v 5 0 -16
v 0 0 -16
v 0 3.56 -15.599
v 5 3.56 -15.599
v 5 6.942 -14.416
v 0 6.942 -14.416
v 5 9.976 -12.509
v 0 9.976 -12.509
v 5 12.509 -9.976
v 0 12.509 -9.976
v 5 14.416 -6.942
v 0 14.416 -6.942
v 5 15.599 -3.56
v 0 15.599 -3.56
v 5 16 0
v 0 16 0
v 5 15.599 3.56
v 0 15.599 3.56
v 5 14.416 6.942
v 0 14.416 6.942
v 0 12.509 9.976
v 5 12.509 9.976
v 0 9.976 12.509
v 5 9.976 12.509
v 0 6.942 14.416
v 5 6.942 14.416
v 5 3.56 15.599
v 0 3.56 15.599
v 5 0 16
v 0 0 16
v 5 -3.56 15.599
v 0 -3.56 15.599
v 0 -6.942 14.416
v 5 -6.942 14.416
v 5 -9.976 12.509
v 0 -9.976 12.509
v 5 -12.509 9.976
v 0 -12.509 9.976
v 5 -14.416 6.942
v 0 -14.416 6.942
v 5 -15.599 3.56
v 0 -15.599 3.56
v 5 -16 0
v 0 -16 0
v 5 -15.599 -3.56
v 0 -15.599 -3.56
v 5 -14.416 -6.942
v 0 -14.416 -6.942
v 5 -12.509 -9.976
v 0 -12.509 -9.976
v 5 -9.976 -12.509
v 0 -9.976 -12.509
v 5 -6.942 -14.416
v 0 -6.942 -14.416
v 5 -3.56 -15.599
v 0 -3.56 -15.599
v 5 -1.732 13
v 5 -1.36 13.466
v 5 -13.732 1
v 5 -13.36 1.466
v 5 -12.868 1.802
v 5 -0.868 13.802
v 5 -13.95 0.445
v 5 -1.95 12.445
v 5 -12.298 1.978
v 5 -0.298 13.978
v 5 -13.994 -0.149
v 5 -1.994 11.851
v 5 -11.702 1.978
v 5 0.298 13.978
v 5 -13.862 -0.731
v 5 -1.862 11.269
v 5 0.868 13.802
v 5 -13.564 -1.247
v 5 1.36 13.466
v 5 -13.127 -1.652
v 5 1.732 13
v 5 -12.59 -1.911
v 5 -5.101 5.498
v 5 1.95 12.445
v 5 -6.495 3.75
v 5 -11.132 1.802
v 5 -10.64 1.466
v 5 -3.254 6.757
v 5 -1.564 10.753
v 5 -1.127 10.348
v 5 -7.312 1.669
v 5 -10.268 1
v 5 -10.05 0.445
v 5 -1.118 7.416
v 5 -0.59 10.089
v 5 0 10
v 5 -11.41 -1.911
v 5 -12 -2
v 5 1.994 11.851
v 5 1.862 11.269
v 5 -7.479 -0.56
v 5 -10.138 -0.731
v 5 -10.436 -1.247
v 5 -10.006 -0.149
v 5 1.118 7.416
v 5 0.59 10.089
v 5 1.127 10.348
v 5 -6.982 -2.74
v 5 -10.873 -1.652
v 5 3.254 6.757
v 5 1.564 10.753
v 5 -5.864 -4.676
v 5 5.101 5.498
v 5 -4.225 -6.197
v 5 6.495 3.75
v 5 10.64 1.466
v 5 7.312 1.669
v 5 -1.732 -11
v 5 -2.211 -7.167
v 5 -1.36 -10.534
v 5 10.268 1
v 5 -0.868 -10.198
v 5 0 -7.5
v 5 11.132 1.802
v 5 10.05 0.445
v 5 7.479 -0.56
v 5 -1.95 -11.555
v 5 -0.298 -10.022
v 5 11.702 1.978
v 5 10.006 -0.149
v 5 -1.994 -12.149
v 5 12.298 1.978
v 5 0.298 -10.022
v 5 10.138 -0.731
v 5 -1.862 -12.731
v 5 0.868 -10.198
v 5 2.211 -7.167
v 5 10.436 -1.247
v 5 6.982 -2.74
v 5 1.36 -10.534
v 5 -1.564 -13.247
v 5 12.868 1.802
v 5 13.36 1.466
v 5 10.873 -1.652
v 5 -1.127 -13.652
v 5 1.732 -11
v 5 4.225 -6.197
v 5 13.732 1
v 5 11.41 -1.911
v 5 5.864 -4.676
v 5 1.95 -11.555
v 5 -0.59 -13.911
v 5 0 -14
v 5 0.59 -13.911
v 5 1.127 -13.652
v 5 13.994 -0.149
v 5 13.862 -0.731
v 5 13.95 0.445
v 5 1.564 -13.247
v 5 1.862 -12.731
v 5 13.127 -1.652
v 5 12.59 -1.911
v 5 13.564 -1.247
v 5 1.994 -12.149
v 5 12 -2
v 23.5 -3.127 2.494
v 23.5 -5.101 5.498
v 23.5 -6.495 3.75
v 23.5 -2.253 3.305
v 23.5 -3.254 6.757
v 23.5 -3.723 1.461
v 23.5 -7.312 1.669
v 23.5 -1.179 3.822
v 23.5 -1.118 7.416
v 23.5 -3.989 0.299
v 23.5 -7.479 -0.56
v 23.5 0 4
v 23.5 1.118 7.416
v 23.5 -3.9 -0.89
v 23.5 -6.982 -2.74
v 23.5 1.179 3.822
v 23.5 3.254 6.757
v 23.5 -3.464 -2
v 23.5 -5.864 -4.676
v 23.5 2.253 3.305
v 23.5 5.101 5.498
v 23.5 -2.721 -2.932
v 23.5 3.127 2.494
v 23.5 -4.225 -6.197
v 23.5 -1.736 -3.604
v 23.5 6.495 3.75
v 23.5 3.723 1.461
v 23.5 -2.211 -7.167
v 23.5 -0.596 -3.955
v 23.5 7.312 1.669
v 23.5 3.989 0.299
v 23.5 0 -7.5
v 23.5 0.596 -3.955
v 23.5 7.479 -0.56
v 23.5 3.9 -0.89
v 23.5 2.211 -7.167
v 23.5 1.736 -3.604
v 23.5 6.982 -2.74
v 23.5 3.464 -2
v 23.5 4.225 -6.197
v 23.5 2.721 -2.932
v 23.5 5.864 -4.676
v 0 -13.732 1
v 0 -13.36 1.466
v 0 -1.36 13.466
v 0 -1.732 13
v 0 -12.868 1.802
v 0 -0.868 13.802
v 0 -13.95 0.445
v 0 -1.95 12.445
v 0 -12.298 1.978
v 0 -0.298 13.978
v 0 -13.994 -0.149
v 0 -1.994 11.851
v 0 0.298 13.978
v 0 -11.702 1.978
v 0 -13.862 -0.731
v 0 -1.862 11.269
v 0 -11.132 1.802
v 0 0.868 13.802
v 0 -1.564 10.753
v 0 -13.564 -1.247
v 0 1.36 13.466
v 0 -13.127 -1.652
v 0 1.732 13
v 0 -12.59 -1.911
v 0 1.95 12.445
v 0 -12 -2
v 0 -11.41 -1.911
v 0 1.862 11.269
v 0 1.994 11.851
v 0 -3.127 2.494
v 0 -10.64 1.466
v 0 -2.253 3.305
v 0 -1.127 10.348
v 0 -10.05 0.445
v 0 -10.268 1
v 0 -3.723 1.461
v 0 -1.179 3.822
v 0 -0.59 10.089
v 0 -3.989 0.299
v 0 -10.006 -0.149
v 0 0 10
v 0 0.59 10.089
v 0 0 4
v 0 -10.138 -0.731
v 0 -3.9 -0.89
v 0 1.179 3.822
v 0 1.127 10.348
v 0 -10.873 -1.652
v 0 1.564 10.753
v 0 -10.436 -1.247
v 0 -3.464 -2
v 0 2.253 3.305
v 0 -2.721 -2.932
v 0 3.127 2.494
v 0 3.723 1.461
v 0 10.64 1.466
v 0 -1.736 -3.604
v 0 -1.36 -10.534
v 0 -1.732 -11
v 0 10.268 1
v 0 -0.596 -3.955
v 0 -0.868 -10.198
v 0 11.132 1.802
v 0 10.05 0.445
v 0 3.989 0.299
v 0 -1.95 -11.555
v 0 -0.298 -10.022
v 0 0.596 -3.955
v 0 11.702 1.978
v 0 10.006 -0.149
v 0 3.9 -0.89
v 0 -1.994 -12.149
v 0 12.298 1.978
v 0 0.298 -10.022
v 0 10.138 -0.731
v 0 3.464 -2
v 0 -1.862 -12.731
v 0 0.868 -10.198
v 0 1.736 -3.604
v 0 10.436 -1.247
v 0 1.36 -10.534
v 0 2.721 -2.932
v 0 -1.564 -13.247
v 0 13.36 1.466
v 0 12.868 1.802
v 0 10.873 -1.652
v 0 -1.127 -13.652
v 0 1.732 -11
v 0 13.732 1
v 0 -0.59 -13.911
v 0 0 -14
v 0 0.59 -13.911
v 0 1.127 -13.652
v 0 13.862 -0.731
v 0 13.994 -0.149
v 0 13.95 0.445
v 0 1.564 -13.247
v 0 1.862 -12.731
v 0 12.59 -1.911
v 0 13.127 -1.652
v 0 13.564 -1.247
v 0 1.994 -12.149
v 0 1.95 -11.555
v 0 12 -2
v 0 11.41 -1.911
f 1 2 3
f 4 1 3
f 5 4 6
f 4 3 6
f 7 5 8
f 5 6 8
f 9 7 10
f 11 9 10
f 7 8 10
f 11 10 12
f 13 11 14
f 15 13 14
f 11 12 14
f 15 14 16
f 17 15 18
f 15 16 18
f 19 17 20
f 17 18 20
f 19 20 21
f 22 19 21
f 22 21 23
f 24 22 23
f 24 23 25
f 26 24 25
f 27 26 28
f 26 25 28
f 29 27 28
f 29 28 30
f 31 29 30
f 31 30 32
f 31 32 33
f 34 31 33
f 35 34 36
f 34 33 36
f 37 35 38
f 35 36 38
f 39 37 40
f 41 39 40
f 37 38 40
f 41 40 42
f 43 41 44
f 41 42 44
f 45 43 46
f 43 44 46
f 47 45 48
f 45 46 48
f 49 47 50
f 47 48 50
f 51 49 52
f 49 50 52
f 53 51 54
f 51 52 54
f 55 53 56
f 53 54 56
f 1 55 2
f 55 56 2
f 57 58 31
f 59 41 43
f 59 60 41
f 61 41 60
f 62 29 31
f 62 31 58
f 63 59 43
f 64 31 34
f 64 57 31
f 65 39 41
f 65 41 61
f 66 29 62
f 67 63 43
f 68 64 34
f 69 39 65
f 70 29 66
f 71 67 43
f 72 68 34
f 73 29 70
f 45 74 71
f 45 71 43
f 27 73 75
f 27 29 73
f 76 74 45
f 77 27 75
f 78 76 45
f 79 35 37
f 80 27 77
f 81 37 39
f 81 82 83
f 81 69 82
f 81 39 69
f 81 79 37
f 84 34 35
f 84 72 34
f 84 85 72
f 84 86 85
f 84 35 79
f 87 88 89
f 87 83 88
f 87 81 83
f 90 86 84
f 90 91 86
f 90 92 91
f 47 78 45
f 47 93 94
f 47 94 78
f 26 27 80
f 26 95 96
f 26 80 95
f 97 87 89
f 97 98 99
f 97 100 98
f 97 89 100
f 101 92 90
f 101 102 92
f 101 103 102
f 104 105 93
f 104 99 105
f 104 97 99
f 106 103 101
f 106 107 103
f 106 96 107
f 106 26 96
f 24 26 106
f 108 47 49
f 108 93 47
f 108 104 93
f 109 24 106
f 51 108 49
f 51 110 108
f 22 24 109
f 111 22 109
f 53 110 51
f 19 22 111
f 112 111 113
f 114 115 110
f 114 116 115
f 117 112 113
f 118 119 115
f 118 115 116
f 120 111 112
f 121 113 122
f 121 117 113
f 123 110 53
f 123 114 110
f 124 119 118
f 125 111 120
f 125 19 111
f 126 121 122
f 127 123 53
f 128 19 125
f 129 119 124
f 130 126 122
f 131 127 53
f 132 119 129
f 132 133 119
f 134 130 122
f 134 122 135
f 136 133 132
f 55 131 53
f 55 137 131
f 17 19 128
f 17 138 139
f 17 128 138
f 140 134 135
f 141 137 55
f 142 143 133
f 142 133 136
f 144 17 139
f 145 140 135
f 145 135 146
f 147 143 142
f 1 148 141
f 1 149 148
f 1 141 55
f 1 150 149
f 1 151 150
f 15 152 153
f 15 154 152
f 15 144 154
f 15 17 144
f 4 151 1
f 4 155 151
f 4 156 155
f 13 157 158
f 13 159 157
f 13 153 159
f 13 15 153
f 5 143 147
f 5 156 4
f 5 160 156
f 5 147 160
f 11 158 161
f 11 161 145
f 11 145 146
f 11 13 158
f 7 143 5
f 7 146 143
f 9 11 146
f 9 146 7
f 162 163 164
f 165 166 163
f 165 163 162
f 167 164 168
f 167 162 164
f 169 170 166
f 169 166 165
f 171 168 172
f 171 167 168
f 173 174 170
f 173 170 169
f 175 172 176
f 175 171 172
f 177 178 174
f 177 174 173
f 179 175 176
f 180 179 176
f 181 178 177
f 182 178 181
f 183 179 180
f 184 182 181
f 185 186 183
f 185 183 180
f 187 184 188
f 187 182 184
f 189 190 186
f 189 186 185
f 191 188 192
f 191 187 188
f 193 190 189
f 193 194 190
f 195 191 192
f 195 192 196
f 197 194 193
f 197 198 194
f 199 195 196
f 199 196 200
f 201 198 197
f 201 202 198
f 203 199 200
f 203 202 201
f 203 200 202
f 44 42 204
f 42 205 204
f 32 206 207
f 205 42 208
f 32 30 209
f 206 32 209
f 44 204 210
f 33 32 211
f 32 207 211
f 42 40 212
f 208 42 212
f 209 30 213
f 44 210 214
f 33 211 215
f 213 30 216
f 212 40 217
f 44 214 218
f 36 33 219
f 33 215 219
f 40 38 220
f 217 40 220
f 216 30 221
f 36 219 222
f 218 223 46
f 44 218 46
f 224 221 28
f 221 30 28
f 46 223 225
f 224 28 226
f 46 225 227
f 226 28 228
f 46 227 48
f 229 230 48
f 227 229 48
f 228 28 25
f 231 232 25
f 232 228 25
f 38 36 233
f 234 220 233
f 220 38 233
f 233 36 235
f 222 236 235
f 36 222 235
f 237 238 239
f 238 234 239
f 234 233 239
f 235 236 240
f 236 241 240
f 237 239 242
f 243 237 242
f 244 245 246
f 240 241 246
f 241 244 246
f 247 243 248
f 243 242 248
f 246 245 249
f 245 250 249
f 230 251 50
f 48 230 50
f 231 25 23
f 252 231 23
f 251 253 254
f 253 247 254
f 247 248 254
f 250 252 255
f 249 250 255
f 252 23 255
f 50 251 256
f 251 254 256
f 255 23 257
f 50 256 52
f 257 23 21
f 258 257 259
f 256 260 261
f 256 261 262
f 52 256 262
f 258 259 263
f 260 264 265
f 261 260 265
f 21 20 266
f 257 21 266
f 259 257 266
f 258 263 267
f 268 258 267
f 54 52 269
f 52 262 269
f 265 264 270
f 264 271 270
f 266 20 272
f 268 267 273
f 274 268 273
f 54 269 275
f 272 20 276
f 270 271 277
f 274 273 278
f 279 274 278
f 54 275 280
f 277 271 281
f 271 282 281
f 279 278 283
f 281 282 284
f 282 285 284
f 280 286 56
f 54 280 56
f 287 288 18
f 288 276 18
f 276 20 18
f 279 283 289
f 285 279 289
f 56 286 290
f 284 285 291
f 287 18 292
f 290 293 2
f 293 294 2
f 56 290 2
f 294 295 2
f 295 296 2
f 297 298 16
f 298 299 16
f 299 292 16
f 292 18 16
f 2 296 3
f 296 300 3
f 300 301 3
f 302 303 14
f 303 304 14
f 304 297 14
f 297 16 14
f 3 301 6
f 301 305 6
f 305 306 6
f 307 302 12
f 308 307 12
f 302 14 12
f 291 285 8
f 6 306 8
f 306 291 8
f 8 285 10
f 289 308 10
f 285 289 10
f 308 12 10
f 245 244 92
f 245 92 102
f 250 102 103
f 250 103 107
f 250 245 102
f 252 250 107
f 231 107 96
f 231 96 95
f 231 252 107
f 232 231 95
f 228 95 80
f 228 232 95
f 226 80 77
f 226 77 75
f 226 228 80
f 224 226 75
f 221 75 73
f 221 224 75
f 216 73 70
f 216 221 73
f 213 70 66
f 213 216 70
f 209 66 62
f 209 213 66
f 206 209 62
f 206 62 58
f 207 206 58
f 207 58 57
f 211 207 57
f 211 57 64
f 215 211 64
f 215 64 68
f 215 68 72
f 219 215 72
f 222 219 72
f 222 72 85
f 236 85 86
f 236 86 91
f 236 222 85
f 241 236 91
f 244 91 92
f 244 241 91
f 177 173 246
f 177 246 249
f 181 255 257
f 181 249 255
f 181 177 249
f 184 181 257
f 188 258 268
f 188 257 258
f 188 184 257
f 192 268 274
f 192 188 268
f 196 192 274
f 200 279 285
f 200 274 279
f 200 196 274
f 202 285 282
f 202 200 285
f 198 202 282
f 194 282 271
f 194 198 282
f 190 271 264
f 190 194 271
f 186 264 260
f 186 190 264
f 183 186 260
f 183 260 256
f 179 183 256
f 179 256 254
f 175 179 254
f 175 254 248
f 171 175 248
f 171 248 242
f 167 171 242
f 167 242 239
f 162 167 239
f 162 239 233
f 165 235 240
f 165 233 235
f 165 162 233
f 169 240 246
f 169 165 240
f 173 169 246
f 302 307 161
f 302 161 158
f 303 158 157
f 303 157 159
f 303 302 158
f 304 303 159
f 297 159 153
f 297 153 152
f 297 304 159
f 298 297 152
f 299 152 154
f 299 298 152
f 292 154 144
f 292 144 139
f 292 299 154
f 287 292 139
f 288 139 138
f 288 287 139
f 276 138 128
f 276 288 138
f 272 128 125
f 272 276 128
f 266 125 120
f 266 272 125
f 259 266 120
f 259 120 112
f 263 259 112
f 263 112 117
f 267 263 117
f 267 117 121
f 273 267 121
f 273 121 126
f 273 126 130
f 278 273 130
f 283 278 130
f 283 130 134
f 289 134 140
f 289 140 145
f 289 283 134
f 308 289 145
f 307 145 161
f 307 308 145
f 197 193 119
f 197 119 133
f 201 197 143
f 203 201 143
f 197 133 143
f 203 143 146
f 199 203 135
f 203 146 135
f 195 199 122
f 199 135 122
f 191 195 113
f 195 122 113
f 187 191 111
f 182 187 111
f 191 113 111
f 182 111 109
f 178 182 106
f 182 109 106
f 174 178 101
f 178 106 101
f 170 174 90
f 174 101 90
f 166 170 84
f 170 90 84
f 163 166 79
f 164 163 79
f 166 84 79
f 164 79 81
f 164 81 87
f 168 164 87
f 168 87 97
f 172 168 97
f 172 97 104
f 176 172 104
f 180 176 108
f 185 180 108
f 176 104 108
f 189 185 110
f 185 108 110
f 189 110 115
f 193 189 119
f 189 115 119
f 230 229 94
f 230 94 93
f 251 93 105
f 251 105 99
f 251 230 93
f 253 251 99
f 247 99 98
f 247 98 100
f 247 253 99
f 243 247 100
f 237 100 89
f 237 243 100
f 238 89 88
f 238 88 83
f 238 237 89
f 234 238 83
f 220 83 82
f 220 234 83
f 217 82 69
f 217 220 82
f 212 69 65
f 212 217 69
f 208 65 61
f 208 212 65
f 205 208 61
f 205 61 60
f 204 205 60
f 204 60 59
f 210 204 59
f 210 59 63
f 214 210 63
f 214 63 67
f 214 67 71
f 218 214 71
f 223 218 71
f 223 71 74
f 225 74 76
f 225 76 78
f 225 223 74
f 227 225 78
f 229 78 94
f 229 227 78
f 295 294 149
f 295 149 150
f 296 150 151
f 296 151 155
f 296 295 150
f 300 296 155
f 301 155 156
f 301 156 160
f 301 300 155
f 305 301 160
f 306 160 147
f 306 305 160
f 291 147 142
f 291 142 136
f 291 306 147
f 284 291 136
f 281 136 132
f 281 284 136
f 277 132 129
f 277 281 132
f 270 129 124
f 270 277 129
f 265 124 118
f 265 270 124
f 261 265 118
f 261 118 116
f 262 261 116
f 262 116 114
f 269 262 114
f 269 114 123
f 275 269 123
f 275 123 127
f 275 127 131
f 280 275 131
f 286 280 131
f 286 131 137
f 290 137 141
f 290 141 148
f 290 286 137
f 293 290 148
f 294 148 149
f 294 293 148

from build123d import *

# Parameters (mm, degrees)
SKETCH1_R               = 16
SKETCH1_R_2             = 2
BOSS_EXTRUDE1_DEPTH     = 5
SKETCH2_R               = 7.5
BOSS_EXTRUDE2_DEPTH     = 18.5
CUT_EXTRUDE1_DEPTH      = 33.622844756
CUT_EXTRUDE1_DEPTH_BACK = 33.622844756
SKETCH3_R               = 4


with BuildPart() as part:
    # Sketch1 → Boss-Extrude1 (new body)
    with BuildSketch(Plane(origin=(0, 0, 0), x_dir=(0, 0, -1), z_dir=(1, 0, 0))):
        Circle(SKETCH1_R)
        with Locations((0, 12)):
            Circle(SKETCH1_R_2, mode=Mode.SUBTRACT)
        with Locations((12, 0)):
            Circle(SKETCH1_R_2, mode=Mode.SUBTRACT)
        with Locations((0, -12)):
            Circle(SKETCH1_R_2, mode=Mode.SUBTRACT)
        with Locations((-12, 0)):
            Circle(SKETCH1_R_2, mode=Mode.SUBTRACT)
    extrude(amount=BOSS_EXTRUDE1_DEPTH)

    # Sketch2 → Boss-Extrude2 (add)
    with BuildSketch(Plane(origin=(5, 0, 0), x_dir=(0, 0, -1), z_dir=(1, 0, 0))):
        Circle(SKETCH2_R)
    extrude(amount=BOSS_EXTRUDE2_DEPTH)

    # Sketch3 → Cut-Extrude1 (cut, two sides: drawn at the far end of the back side and taken through both)
    with BuildSketch(Plane.ZY.offset(-CUT_EXTRUDE1_DEPTH_BACK)):
        Circle(SKETCH3_R)
    extrude(amount=CUT_EXTRUDE1_DEPTH + CUT_EXTRUDE1_DEPTH_BACK, mode=Mode.SUBTRACT)


solid = part.part
